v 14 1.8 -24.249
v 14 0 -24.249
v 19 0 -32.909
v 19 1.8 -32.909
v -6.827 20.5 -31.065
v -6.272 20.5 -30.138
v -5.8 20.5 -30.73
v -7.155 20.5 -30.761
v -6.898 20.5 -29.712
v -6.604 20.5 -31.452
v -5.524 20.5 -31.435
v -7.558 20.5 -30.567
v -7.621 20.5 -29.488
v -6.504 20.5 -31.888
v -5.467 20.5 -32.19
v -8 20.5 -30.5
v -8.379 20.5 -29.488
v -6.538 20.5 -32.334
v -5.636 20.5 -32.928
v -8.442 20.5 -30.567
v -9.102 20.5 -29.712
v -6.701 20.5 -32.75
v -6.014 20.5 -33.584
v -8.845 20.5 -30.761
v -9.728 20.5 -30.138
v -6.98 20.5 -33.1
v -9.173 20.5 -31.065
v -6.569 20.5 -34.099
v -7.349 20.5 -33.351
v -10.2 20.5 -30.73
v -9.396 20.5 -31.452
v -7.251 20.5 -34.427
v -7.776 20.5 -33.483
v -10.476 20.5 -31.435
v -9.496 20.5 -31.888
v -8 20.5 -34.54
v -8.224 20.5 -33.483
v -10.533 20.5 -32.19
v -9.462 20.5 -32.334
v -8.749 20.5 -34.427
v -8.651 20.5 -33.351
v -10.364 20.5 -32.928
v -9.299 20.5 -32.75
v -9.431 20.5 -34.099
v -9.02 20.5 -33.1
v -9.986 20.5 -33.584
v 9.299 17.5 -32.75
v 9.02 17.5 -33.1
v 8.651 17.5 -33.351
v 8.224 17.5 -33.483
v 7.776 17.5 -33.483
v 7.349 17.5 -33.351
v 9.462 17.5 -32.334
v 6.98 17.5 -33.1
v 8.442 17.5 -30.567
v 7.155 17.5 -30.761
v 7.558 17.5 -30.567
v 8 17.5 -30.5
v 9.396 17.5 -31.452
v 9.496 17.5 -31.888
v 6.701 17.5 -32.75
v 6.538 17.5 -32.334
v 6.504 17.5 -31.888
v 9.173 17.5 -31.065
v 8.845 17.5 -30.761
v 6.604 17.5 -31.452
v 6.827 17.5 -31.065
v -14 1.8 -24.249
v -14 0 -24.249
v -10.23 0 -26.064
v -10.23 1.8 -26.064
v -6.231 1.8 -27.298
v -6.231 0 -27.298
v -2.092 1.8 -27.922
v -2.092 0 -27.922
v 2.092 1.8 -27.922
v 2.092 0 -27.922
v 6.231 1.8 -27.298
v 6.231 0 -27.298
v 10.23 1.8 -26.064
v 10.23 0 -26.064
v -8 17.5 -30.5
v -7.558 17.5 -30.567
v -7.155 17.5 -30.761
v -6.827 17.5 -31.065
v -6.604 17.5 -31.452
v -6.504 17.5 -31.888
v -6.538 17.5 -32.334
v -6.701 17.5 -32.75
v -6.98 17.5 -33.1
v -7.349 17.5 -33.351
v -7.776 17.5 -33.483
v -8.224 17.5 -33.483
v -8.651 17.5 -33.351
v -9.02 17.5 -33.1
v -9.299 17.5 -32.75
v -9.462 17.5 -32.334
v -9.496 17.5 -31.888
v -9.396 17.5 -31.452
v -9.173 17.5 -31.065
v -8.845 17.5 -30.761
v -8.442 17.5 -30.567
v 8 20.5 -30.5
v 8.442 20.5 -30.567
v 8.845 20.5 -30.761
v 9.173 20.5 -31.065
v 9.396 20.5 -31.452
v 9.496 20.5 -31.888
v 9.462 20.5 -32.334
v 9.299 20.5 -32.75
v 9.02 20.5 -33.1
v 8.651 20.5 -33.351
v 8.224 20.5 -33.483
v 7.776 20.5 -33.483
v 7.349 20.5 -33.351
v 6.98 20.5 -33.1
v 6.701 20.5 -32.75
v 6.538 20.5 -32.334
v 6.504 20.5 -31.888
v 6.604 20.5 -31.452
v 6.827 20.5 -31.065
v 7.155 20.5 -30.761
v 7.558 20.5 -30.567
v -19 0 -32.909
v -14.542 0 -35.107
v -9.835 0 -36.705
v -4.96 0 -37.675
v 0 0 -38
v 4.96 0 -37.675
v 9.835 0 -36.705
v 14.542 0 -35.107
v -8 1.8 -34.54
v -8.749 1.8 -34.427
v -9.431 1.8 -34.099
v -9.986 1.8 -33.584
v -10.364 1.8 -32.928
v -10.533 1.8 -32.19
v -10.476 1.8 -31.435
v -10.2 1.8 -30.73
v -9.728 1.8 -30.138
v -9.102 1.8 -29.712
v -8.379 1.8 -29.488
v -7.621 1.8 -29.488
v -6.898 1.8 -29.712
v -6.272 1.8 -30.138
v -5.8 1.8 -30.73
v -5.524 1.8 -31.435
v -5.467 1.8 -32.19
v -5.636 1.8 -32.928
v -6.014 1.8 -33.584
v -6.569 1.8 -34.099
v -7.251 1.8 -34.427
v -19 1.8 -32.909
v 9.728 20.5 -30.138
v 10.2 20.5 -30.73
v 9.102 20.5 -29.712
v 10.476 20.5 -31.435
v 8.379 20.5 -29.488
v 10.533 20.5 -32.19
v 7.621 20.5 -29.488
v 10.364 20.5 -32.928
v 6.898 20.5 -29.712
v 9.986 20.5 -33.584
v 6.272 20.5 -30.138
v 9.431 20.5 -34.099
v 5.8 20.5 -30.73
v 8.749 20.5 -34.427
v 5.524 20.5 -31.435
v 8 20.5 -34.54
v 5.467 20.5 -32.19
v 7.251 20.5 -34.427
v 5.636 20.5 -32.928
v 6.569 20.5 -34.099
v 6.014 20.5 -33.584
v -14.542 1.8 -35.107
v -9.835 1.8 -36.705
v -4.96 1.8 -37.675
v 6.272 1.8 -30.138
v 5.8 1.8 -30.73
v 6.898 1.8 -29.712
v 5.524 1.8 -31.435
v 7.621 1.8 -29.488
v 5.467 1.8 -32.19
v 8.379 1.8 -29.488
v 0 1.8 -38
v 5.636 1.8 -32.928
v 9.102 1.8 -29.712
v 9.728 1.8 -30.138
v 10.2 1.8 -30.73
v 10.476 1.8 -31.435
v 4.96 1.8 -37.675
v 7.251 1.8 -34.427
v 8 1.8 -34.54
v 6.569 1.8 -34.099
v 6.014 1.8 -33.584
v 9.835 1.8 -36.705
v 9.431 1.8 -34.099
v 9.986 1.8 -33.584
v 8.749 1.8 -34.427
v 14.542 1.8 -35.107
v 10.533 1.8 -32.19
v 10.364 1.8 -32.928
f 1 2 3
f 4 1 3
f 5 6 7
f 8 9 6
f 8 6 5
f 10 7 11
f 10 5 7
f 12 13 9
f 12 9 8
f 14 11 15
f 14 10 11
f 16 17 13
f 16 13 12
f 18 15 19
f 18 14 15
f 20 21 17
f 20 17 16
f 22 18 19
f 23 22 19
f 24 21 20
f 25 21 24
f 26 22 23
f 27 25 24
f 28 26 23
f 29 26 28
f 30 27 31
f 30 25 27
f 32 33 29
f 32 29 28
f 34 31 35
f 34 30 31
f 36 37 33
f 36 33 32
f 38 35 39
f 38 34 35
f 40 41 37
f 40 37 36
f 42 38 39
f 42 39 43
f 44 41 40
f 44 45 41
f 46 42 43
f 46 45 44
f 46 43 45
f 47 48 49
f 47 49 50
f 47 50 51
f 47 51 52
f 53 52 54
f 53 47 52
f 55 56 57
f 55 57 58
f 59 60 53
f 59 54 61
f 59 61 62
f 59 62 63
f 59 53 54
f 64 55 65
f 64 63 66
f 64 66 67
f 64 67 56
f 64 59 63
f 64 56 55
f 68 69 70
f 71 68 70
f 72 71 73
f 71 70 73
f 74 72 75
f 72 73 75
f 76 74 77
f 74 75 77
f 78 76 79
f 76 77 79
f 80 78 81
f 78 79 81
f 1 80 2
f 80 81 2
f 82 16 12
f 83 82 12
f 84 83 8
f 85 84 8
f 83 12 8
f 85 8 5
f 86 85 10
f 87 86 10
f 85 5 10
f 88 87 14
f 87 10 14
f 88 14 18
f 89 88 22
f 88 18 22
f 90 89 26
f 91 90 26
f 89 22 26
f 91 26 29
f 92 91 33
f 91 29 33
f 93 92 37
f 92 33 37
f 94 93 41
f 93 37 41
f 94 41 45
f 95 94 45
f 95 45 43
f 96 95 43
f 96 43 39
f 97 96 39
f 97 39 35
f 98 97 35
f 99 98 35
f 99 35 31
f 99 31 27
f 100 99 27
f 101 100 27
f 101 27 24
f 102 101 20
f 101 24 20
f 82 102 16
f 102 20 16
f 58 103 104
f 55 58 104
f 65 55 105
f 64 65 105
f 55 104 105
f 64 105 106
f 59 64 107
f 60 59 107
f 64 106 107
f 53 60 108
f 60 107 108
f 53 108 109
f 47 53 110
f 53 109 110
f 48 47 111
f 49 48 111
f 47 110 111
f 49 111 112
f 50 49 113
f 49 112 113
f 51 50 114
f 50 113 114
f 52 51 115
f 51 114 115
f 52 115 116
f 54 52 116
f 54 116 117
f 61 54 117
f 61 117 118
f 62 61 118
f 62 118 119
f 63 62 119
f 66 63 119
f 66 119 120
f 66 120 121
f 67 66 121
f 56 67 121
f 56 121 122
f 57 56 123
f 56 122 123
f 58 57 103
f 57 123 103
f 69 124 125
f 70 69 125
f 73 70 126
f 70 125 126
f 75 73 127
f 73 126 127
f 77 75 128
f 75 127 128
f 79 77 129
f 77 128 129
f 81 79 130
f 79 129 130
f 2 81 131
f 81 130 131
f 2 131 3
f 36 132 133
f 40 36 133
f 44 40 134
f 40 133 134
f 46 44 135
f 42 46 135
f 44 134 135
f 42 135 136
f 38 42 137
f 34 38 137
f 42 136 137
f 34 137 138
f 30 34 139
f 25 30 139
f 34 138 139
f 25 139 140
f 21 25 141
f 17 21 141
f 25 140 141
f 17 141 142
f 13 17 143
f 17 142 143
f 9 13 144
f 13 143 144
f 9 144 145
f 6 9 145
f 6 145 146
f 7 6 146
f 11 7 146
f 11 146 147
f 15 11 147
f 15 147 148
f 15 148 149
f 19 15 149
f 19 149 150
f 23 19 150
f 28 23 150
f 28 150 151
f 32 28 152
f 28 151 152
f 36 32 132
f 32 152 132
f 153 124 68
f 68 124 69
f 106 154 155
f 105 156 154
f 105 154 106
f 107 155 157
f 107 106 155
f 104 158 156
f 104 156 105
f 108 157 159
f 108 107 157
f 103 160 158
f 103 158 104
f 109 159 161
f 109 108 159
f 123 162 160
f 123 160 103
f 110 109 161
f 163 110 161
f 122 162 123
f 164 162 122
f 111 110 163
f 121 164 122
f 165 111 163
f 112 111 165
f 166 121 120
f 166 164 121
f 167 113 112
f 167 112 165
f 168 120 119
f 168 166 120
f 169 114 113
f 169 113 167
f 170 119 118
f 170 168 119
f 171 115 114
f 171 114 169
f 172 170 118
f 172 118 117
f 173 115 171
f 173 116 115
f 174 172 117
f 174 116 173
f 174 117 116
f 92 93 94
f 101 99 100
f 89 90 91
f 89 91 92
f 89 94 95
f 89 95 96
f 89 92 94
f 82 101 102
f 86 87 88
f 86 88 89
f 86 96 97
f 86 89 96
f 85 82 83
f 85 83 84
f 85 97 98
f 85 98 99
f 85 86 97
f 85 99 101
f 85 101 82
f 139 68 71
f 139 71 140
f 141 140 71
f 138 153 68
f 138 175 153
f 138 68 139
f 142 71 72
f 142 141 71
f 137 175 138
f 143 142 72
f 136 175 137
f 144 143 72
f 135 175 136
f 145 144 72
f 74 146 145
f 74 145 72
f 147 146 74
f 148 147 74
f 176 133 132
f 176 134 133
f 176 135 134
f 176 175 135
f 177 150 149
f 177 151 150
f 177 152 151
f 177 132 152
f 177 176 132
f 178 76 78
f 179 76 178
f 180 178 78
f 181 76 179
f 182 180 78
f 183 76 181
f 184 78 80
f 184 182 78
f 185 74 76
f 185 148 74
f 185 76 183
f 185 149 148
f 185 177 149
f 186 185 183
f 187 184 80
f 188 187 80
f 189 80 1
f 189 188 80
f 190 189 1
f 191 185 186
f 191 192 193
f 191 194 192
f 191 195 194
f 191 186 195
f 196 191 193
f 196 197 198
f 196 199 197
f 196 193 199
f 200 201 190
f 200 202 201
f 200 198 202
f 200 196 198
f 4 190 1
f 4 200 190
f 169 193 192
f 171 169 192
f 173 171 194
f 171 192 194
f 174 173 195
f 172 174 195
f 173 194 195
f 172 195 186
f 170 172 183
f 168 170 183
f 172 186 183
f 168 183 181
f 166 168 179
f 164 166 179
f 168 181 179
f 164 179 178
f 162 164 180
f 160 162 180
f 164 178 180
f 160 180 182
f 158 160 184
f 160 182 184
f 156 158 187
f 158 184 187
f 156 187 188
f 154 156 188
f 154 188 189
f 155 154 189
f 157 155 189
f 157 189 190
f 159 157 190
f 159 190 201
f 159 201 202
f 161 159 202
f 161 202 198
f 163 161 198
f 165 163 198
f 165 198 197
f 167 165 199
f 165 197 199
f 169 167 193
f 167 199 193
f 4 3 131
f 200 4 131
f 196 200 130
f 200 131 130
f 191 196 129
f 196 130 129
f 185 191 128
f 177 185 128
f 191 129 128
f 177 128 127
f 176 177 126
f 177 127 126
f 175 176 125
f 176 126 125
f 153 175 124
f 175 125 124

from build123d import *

# Parameters (mm, degrees)
BOSS_EXTRUDE1_DEPTH = 1.8
SKETCH2_R           = 2.54
BOSS_EXTRUDE2_DEPTH = 18.7
SKETCH5_R           = 1.5
CUT_EXTRUDE1_DEPTH  = 3


with BuildPart() as part:
    # Sketch1 → Boss-Extrude1 (new body)
    with BuildSketch(Plane(origin=(0, 0, 0), x_dir=(1, 0, 0), z_dir=(0, 1, 0))):
        with BuildLine():
            Line((-19, 32.908965344), (-14, 24.248711306))
            ThreePointArc((-14, 24.248711306), (0, 28), (14, 24.248711306))
            Line((14, 24.248711306), (19, 32.908965344))
            ThreePointArc((19, 32.908965344), (0, 38), (-19, 32.908965344))
        make_face()
    extrude(amount=BOSS_EXTRUDE1_DEPTH)

    # Sketch2 → Boss-Extrude2 (add)
    with BuildSketch(Plane(origin=(0, 1.8, 0), x_dir=(1, 0, 0), z_dir=(0, 1, 0))):
        with Locations(Location((-8, 32, 0), (0, 0, 90))):
            Circle(SKETCH2_R)
        with Locations(Location((8, 32, 0), (0, 0, 90))):
            Circle(SKETCH2_R)
    extrude(amount=BOSS_EXTRUDE2_DEPTH)

    # Sketch5 → Cut-Extrude1 (cut)
    with BuildSketch(Plane(origin=(0, 20.5, 0), x_dir=(1, 0, 0), z_dir=(0, 1, 0))):
        with Locations(Location((-8, 32, 0), (0, 0, 270))):
            Circle(SKETCH5_R)
        with Locations(Location((8, 32, 0), (0, 0, 270))):
            Circle(SKETCH5_R)
    extrude(amount=-CUT_EXTRUDE1_DEPTH, mode=Mode.SUBTRACT)


solid = part.part
